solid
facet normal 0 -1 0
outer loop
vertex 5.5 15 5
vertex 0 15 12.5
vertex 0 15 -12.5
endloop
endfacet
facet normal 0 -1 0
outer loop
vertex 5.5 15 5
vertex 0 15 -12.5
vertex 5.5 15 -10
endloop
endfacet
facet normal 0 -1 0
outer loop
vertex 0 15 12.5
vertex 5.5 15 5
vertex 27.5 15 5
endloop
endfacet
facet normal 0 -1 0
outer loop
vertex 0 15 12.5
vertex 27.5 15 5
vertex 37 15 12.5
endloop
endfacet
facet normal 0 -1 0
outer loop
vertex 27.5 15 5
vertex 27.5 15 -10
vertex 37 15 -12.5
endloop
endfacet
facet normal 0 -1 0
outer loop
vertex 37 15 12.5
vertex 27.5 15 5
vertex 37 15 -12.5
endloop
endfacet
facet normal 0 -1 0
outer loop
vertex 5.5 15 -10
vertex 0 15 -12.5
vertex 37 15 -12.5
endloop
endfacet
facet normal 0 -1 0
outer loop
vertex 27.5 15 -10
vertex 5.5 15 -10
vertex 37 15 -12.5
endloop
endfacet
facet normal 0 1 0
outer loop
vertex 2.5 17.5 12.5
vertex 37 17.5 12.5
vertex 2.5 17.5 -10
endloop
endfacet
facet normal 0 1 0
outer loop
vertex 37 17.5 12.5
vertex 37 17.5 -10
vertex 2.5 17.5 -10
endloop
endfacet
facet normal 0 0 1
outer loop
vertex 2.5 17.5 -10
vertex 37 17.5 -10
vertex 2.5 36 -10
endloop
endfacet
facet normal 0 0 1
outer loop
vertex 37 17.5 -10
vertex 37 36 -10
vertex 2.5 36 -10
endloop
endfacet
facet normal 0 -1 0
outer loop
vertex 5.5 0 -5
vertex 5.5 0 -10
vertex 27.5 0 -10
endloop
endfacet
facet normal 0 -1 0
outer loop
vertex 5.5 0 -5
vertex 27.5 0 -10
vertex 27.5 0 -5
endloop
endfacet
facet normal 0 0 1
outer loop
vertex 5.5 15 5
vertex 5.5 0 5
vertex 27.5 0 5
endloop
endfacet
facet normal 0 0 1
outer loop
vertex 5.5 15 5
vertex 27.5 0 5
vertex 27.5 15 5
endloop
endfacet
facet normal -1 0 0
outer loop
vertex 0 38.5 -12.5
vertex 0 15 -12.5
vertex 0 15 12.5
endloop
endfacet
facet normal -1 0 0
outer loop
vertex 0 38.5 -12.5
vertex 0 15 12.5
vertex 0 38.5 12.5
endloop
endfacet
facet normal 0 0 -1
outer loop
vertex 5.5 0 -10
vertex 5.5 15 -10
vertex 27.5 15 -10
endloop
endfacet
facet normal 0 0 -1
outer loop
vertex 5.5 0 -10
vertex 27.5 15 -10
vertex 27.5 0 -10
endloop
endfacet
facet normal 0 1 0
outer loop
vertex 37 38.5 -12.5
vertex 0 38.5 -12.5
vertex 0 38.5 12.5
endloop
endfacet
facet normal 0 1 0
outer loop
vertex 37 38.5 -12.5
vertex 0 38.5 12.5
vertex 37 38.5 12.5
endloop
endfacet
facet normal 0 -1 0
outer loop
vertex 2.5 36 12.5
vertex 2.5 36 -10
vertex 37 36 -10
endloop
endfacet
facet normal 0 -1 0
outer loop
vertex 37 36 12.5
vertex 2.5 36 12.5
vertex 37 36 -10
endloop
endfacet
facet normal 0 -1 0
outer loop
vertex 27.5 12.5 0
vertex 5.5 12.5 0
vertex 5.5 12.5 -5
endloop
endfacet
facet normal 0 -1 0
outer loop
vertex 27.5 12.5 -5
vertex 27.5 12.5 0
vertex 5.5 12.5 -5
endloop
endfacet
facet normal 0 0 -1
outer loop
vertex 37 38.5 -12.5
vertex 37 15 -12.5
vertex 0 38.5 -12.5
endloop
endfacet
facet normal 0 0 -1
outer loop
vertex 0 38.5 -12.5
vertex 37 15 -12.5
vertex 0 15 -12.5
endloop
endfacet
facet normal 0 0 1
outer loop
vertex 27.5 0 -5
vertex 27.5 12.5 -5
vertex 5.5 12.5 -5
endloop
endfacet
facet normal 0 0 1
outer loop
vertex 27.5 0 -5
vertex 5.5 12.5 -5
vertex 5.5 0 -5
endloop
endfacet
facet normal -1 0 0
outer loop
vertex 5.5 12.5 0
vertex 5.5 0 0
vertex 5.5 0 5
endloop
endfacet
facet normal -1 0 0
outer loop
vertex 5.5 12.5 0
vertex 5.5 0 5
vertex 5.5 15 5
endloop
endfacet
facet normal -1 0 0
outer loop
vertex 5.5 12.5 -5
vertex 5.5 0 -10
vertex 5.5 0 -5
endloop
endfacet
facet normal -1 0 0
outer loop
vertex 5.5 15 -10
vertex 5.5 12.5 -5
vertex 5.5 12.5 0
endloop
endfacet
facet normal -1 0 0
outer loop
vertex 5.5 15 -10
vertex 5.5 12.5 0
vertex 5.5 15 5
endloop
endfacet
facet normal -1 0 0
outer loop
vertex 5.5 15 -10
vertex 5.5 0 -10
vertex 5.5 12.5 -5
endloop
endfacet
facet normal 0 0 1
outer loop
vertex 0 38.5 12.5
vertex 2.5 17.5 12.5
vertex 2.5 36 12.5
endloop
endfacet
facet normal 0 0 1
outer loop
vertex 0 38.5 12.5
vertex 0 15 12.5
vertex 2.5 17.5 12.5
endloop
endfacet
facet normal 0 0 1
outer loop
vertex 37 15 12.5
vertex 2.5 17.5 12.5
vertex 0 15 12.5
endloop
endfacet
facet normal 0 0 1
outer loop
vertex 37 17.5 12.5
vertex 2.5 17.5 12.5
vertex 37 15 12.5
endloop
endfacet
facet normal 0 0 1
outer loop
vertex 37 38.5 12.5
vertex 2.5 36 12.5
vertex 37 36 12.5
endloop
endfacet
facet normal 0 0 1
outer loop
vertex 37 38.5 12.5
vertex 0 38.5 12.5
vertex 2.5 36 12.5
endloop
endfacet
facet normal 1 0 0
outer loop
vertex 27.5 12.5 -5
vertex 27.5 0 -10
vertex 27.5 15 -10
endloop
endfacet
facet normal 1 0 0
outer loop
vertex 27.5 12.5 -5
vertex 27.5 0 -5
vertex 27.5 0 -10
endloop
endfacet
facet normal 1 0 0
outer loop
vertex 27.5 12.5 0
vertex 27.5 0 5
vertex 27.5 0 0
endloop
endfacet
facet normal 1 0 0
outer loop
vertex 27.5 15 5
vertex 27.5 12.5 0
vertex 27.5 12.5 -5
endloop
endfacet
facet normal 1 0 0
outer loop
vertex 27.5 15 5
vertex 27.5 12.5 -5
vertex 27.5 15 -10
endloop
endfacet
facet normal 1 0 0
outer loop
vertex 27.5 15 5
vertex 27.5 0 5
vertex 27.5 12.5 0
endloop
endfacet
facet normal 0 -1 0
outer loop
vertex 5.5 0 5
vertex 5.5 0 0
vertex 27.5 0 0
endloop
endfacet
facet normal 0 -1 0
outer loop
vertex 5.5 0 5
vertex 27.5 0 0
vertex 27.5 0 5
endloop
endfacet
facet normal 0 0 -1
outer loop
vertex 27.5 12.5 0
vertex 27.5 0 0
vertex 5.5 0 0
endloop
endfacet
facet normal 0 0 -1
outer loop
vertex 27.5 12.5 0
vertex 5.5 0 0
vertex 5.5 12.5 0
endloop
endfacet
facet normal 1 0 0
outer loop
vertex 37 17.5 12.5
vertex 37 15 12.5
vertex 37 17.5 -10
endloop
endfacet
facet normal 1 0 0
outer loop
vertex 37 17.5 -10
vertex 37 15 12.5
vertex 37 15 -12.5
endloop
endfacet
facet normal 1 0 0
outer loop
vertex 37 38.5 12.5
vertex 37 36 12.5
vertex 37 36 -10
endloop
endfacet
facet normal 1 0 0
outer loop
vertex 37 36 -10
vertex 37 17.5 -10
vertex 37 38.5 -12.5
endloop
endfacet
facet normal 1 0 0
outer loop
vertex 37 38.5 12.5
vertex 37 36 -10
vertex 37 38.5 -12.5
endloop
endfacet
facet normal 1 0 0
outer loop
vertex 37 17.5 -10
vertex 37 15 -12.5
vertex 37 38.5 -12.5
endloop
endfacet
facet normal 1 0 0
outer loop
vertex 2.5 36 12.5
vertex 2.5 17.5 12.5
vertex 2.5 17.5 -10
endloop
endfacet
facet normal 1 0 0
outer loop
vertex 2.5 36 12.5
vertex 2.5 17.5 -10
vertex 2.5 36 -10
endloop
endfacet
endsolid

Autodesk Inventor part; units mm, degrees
ref_plane "YZ Plane" through (0, 0, 0) normal (1, 0, 0) x (0, 1, 0)
ref_plane "XZ Plane" through (0, 0, 0) normal (0, 1, 0) x (-1, 0, 0)
ref_plane "XY Plane" through (0, 0, 0) normal (0, 0, 1) x (1, 0, 0)
sketch "Sketch1" plane through (0, 0, 0) normal (1, 0, 0) x (0, 1, 0)
  line L0 (0, 0) -> (12.5, 0)
  line L1 (12.5, 0) -> (12.5, -5)
  line L2 (12.5, -5) -> (0, -5)
  line L3 (0, 0) -> (0, 5)
  line L4 (0, 5) -> (15, 5)
  line L5 (15, 5) -> (15, -10)
  line L6 (15, -10) -> (0, -10)
  line L7 (0, -10) -> (0, -5)
  dimension "d0" = 12.5
  dimension "d2" = 5
  dimension "d3" = 15
  dimension "d4" = 15
  dimension "d5" = 5
extrude "Extrusion1" add sketch "Sketch1" along normal blind 27.5
sketch "Sketch2" plane through (0, 0, 5) normal (0, 0, 1) x (1, 0, 0)
  line L0 (0, 15) -> (27.5, 15) projected
  line L1 (0, 15) -> (0, 36)
  line L2 (0, 36) -> (2.5, 36)
  line L3 (0, 15) -> (39.5, 15)
  line L4 (39.5, 15) -> (39.5, 36)
  line L5 (39.5, 36) -> (37, 36)
  line L6 (37, 36) -> (37, 17.5)
  line L7 (37, 17.5) -> (2.5, 17.5)
  line L8 (2.5, 17.5) -> (2.5, 36)
  line L9 (0, 0) -> (27.5, 0) projected
  dimension "d8" = 21
  dimension "d9" = 2.5
  dimension "d10" = 39.5
  dimension "d11" = 2.5
  dimension "d12" = 18.5
  dimension "d13" = 17.5
extrude "Extrusion2" add sketch "Sketch2" against normal up to surface (15 mm away)
sketch "Sketch3" plane through (27.5, 0, -10) normal (0, 0, -1) x (-1, 0, 0)
  line L0 (27.5, 0) -> (22, 0)
  line L1 (22, 0) -> (22, 15)
  line L2 (22, 15) -> (27.5, 15)
  line L3 (27.5, 15) -> (27.5, 0)
  dimension "d16" = 5.5
  dimension "d17" = 15
extrude "Extrusion3" cut sketch "Sketch3" against normal up to surface (15 mm away)
sketch "Sketch4" plane through (37, 17.5, -10) normal (0, 0, -1) x (-1, 0, 0)
  line L0 (-2.5, -2.5) -> (9.5, -2.5) projected
  line L1 (37, 18.5) -> (34.5, 18.5) projected
  line L2 (-2.5, -2.5) -> (37, -2.5)
  line L3 (37, -2.5) -> (37, 18.5)
  line L4 (37, 18.5) -> (-2.5, 18.5)
  line L5 (-2.5, 18.5) -> (-2.5, -2.5)
  point P0 (37, -17.5)
extrude "Extrusion4" add sketch "Sketch4" along normal blind 2.5
sketch "Sketch5" plane through (2.5, 17.5, 5) normal (0, 0, 1) x (1, 0, 0)
  line L0 (37, -2.5) -> (25, -2.5) projected
  line L1 (37, 18.5) -> (37, -2.5) projected
  line L2 (34.5, 18.5) -> (37, 18.5) projected
  line L3 (34.5, 0) -> (34.5, 18.5) projected
  line L4 (0, 0) -> (34.5, 0) projected
  line L5 (0, 18.5) -> (0, 0) projected
  line L6 (-2.5, 18.5) -> (0, 18.5) projected
  line L7 (-2.5, -2.5) -> (-2.5, 18.5) projected
  line L8 (-2.5, -2.5) -> (3, -2.5) projected
  line L9 (37, 18.5) -> (37, -2.5) projected
  line L10 (37, -2.5) -> (25, -2.5) projected
  line L11 (37, 18.5) -> (34.5, 18.5)
  line L12 (34.5, 18.5) -> (34.5, 0)
  line L13 (34.5, -2.5) -> (37, -2.5)
  line L14 (37, -2.5) -> (37, 18.5)
  line L15 (0, 18.5) -> (0, 0) projected
  line L16 (-2.5, -2.5) -> (3, -2.5) projected
  line L17 (0, 18.5) -> (-2.5, 18.5)
  line L18 (-2.5, 18.5) -> (-2.5, -2.5)
  line L19 (-2.5, -2.5) -> (0, -2.5)
  line L20 (0, 0) -> (0, 18.5)
  line L21 (0, 0) -> (34.5, 0) projected
  line L22 (0, 0) -> (34.5, 0)
  line L23 (0, -2.5) -> (34.5, -2.5)
  line L24 (37, -2.5) -> (-2.5, -2.5) projected
  dimension "d22" = 34.5
  dimension "d23" = 34.5
extrude "Extrusion5" add sketch "Sketch5" along normal blind 2.5
sketch "Sketch6" plane through (2.5, 36, -10) normal (0, 1, 0) x (1, 0, 0)
  line L0 (37, -17.5) -> (37, 2.5) projected
  line L1 (-2.5, 2.5) -> (-2.5, -17.5) projected
  line L2 (37, 2.5) -> (-2.5, 2.5)
  line L3 (-2.5, 2.5) -> (-2.5, -17.5)
  line L4 (-2.5, -17.5) -> (37, -17.5)
  line L5 (37, -17.5) -> (37, 2.5)
  point P0 (-2.5, -10)
extrude "Extrusion6" add sketch "Sketch6" along normal blind 2.5
sketch "Sketch7" plane through (2.5, 17.5, 7.5) normal (0, 0, 1) x (1, 0, 0)
  line L0 (34.5, 18.5) -> (34.5, 0) projected
  line L1 (34.5, 0) -> (0, 0) projected
  line L2 (0, 0) -> (0, 18.5) projected
  line L3 (0, 18.5) -> (34.5, 18.5) projected
  line L4 (37, -2.5) -> (37, 21) projected
  line L5 (-2.5, 21) -> (37, 21) projected
  line L6 (-2.5, -2.5) -> (-2.5, 21) projected
  line L7 (-2.5, -2.5) -> (37, -2.5) projected
  line L8 (-2.5, -2.5) -> (37, -2.5) projected
  line L9 (37, 21) -> (34.5, 21)
  line L10 (34.5, 21) -> (34.5, -2.5)
  line L11 (34.5, -2.5) -> (37, -2.5)
  line L12 (37, -2.5) -> (37, 21)
  point P0 (-2.5, -17.5)
  dimension "d28" = 2.5
extrude "Extrusion7" cut sketch "Sketch7" against normal up to next contours L10 L5 L4 L7 L0
sketch "Sketch8" plane through (2.5, 17.5, 7.5) normal (0, 0, 1) x (1, 0, 0)
  line L0 (34.5, -2.5) -> (34.5, 0) projected
  line L1 (34.5, 0) -> (0, 0) projected
  line L2 (0, 0) -> (0, 18.5) projected
  line L3 (0, 18.5) -> (34.5, 18.5) projected
  line L4 (34.5, 18.5) -> (34.5, 21) projected
  line L5 (-2.5, 21) -> (34.5, 21) projected
  line L6 (-2.5, -2.5) -> (-2.5, 21) projected
  line L7 (-2.5, -2.5) -> (34.5, -2.5) projected
  line L8 (34.5, -2.5) -> (-2.5, -2.5)
  line L9 (-2.5, -2.5) -> (-2.5, 0)
  line L10 (0, 0) -> (34.5, 0)
  line L11 (34.5, 0) -> (34.5, -2.5)
  line L12 (34.5, 21) -> (-2.5, 21)
  line L13 (-2.5, 21) -> (-2.5, 18.5)
  line L14 (0, 18.5) -> (34.5, 18.5)
  line L15 (34.5, 18.5) -> (34.5, 21)
  line L16 (0, 18.5) -> (0, 0)
  line L17 (-2.5, 18.5) -> (-2.5, 0)
  dimension "d31" = 18.5
extrude "Extrusion8" add sketch "Sketch8" along normal blind 5
properties part number "battery-holder"
